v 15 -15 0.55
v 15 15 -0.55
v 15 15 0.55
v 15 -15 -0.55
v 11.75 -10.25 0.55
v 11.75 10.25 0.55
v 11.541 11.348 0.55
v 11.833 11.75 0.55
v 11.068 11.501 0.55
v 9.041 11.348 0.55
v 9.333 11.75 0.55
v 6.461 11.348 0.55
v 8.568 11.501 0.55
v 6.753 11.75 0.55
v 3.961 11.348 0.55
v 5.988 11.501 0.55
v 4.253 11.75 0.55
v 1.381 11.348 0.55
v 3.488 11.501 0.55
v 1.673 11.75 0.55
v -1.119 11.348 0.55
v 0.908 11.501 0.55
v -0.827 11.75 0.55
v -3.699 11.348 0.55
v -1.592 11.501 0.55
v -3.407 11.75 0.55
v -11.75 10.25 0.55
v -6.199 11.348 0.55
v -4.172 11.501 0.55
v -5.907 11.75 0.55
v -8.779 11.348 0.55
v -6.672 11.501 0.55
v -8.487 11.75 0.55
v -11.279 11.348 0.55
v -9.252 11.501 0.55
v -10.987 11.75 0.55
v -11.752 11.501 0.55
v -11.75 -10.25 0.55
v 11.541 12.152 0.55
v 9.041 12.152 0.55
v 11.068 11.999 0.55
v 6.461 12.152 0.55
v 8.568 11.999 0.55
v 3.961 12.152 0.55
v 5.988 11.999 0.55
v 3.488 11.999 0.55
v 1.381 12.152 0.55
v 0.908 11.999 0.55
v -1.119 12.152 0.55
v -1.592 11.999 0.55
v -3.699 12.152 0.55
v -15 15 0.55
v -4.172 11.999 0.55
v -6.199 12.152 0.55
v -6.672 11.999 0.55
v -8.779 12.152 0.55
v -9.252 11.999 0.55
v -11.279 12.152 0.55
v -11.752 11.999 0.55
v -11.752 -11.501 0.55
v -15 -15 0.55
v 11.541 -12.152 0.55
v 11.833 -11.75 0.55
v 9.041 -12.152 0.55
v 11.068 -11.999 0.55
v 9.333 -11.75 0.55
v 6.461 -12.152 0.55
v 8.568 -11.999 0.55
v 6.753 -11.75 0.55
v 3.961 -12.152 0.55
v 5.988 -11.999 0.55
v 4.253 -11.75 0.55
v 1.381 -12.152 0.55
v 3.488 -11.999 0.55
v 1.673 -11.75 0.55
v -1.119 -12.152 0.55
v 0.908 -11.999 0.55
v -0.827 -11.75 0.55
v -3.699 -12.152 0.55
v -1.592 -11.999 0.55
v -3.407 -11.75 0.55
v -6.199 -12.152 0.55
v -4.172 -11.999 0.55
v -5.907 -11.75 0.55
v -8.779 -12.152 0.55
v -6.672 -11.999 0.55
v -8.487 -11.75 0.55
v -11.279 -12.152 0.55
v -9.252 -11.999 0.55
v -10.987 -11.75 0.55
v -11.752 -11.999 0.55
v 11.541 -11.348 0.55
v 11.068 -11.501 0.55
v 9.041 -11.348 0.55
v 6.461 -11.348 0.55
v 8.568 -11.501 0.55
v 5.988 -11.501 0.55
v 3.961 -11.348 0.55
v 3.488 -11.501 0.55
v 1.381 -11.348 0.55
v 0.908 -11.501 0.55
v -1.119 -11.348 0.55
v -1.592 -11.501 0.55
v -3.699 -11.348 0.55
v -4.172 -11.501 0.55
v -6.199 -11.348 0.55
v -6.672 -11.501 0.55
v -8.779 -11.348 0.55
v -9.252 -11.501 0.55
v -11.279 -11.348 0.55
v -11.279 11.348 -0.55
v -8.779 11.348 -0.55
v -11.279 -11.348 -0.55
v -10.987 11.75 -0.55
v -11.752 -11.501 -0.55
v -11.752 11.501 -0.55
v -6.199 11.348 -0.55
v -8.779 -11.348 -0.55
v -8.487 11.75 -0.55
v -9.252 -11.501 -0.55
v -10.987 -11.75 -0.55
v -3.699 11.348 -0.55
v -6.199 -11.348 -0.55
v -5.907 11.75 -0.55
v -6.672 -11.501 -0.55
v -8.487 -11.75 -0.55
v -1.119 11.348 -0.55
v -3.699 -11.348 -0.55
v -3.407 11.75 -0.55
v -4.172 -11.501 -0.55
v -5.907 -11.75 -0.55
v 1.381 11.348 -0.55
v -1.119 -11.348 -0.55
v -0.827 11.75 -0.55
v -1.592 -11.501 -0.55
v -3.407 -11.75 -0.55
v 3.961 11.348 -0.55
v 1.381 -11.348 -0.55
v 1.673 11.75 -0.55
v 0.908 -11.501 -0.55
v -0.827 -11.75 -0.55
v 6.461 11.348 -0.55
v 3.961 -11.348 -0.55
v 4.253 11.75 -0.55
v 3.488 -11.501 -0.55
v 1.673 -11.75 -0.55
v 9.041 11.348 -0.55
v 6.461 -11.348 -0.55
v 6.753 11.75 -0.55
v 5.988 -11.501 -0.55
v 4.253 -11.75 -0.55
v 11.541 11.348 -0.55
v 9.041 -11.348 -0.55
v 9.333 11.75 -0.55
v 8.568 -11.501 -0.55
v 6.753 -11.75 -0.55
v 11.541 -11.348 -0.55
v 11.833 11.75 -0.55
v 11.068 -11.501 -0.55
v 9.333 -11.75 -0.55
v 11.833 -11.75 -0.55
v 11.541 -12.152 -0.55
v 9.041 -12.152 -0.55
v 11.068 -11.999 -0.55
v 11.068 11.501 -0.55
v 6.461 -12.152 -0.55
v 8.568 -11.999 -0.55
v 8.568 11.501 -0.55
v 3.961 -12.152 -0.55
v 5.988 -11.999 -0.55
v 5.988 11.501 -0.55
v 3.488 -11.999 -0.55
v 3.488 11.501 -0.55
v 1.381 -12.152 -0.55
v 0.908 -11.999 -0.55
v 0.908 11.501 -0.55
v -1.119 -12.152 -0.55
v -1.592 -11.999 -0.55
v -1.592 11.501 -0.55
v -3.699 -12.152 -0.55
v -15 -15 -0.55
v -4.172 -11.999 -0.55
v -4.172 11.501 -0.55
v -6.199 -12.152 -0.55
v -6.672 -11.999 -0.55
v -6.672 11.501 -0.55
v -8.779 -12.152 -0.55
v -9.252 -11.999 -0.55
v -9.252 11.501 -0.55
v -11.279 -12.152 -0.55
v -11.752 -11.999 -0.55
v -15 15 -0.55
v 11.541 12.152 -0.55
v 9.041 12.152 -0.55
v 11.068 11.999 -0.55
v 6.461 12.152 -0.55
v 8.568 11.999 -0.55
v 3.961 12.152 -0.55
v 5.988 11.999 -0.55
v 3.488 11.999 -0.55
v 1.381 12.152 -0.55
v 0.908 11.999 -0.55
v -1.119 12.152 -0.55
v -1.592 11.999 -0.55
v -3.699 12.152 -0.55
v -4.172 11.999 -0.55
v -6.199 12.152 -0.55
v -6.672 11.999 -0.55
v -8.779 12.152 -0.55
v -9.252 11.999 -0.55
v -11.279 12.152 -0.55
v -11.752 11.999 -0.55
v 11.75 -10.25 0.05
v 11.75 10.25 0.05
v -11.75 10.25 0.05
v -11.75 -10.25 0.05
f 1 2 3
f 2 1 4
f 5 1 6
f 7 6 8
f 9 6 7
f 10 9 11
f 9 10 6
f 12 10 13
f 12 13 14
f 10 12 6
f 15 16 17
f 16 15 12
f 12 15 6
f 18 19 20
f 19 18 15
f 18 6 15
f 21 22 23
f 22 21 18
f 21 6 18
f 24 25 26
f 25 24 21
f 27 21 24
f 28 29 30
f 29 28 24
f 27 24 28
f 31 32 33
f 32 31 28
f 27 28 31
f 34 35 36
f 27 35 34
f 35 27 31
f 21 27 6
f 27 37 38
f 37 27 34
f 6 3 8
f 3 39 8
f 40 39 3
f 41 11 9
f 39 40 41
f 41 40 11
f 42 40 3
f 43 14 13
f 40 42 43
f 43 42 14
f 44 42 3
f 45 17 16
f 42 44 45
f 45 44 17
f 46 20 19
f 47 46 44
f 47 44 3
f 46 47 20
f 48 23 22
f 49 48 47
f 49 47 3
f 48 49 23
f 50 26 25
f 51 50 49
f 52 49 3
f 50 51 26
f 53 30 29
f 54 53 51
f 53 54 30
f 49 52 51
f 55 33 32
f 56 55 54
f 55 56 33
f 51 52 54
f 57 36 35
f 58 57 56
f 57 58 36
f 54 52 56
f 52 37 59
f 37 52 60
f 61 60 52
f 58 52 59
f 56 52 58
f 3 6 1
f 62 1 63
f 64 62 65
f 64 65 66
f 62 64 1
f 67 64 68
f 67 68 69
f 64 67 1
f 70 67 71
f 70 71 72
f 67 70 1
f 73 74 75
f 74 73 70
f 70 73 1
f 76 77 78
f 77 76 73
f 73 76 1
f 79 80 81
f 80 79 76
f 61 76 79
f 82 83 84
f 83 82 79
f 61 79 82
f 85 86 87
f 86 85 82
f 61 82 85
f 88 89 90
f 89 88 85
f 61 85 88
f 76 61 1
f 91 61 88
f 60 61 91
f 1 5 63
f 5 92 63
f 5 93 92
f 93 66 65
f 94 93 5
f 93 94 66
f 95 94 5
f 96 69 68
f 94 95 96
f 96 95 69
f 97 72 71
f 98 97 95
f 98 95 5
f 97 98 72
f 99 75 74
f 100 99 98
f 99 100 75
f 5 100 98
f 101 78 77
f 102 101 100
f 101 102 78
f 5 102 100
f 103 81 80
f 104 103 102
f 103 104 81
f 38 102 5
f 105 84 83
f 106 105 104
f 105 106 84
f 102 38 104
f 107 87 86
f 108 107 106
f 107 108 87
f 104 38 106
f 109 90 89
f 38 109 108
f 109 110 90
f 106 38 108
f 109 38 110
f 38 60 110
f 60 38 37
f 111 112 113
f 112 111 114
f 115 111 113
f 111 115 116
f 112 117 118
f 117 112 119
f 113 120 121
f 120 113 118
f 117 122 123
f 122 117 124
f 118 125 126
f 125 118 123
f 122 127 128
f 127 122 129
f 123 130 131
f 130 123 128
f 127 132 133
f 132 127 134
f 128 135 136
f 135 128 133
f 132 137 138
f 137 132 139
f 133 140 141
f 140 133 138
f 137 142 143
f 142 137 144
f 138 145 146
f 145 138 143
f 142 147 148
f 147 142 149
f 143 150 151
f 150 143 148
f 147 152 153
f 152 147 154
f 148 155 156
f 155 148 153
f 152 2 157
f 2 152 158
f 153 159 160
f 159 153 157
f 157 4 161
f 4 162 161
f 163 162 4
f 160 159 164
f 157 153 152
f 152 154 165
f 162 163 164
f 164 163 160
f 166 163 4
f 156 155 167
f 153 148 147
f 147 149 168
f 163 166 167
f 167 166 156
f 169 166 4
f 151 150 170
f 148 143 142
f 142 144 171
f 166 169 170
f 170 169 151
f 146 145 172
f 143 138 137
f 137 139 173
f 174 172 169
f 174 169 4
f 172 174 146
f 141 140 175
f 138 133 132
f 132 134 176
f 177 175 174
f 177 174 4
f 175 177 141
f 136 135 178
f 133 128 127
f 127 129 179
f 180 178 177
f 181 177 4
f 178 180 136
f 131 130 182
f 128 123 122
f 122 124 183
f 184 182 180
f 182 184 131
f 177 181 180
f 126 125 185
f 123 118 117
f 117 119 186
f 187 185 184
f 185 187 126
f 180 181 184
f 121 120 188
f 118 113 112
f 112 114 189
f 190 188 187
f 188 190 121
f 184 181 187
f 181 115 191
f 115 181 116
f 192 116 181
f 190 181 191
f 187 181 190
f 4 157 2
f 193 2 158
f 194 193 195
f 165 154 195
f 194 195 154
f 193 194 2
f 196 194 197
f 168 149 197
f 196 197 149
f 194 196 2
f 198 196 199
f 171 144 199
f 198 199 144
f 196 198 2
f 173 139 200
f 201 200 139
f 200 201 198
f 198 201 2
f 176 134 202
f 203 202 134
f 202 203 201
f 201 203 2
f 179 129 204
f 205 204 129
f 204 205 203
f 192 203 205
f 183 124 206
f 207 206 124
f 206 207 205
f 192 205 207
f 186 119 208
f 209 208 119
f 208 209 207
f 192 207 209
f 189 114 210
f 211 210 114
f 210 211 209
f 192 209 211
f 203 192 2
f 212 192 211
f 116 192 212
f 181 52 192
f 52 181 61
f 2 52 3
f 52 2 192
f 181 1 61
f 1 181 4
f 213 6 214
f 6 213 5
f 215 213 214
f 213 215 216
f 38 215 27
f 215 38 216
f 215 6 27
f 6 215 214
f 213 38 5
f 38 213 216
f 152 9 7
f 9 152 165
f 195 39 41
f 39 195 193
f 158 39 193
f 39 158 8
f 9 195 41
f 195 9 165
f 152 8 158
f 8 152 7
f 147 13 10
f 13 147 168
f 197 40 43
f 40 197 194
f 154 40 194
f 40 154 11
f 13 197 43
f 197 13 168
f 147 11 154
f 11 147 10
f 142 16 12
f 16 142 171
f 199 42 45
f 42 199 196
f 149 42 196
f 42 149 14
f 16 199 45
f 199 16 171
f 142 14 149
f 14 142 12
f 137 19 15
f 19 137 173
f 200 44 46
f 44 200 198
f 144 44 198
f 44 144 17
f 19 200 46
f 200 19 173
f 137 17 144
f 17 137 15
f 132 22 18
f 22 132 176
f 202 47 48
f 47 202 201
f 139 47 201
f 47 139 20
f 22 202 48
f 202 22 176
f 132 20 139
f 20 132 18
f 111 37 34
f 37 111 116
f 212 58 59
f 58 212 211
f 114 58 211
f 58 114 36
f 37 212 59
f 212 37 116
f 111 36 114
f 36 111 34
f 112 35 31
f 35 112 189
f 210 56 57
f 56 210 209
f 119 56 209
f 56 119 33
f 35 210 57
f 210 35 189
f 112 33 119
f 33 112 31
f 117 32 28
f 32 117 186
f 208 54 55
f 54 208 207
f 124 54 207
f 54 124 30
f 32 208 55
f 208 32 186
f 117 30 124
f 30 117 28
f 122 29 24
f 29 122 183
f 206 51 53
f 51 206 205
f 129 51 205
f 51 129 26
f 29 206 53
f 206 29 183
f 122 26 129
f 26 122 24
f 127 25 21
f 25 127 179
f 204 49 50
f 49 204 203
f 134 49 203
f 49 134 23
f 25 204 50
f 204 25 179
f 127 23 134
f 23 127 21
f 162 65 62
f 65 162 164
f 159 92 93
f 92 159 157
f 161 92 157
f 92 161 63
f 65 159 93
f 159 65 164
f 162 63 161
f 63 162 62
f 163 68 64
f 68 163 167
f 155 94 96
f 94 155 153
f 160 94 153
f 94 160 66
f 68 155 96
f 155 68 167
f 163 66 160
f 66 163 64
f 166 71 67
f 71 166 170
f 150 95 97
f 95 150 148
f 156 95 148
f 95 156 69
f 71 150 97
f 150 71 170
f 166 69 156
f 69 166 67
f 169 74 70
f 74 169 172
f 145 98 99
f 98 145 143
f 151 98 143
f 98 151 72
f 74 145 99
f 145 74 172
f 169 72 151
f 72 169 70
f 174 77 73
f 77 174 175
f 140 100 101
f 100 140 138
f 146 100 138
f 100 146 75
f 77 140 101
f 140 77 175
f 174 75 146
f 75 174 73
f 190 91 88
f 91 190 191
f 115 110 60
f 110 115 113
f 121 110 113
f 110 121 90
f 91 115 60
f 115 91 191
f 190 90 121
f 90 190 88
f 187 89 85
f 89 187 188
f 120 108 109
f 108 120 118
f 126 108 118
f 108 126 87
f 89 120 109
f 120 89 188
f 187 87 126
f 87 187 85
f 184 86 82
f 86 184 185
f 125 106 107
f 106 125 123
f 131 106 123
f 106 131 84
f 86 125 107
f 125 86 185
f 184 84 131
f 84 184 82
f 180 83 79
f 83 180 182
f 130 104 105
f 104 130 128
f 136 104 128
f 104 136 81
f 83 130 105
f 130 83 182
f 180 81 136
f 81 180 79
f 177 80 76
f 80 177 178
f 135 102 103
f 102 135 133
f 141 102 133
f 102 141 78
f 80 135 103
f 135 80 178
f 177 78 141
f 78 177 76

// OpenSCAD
//substrate 

module substrate()
{
    x=30;
    y=30;
    z=1.1;
    d=0.8461;
    
        //negative y
    difference(){
    difference(){
    difference(){
    difference(){
    difference(){
    difference(){
    difference(){
    difference(){
    difference(){
    difference(){
       // positive y 
    difference(){
    difference(){
    difference(){
    difference(){
    difference(){
    difference(){
    difference(){
    difference(){
    difference(){
    difference(){
        difference(){
        //glass substrate
        cube ([x,y,z], center = true);
            
            // area to place holder
            translate([0,0,z/2])
            cube([x-6.5,y-9.5,1], center = true);}
            
     // positive y posiitve x   
        translate([x/2-3.59,y/2-3.25,0])
        cylinder(r=d/2, h=z+1.1, center =true);}
        
        translate([x/2-6.09,y/2-3.25,0])
        cylinder(r=d/2, h=z+1.1, center =true);}
        
          translate([x/2-8.67,y/2-3.25,0])
        cylinder(r=d/2, h=z+1.1, center =true);}
        
        translate([x/2-11.17,y/2-3.25,0])
        cylinder(r=d/2, h=z+1.1, center =true);}
        
        translate([x/2-13.75,y/2-3.25,0])
        cylinder(r=d/2, h=z+1.1, center =true);}
        
        //positive y negative x
        translate([-(x/2-3.59),y/2-3.25,0])
        cylinder(r=d/2, h=z+1.1, center =true);}
        
        translate([-(x/2-6.09),y/2-3.25,0])
        cylinder(r=d/2, h=z+1.1, center =true);}
        
          translate([-(x/2-8.67),y/2-3.25,0])
        cylinder(r=d/2, h=z+1.1, center =true);}
        
        translate([-(x/2-11.17),y/2-3.25,0])
        cylinder(r=d/2, h=z+1.1, center =true);}
        
        translate([-(x/2-13.75),y/2-3.25,0])
        cylinder(r=d/2, h=z+1.1, center =true);}
        
         // negative y positve x   
        translate([x/2-3.59,-(y/2-3.25),0])
        cylinder(r=d/2, h=z+1.1, center =true);}
        
        translate([x/2-6.09,-(y/2-3.25),0])
        cylinder(r=d/2, h=z+1.1, center =true);}
        
          translate([x/2-8.67,-(y/2-3.25),0])
        cylinder(r=d/2, h=z+1.1, center =true);}
        
        translate([x/2-11.17,-(y/2-3.25),0])
        cylinder(r=d/2, h=z+1.1, center =true);}
        
        translate([x/2-13.75,-(y/2-3.25),0])
        cylinder(r=d/2, h=z+1.1, center =true);}
        
        //negative y negative x
        translate([-(x/2-3.59),-(y/2-3.25),0])
        cylinder(r=d/2, h=z+1.1, center =true);}
        
        translate([-(x/2-6.09),-(y/2-3.25),0])
        cylinder(r=d/2, h=z+1.1, center =true);}
        
          translate([-(x/2-8.67),-(y/2-3.25),0])
        cylinder(r=d/2, h=z+1.1, center =true);}
        
        translate([-(x/2-11.17),-(y/2-3.25),0])
        cylinder(r=d/2, h=z+1.1, center =true);}
        
        translate([-(x/2-13.75),-(y/2-3.25),0])
        cylinder(r=d/2, h=z+1.1, center =true);}
        
        
    
    
    
    
   
 }
 substrate();
